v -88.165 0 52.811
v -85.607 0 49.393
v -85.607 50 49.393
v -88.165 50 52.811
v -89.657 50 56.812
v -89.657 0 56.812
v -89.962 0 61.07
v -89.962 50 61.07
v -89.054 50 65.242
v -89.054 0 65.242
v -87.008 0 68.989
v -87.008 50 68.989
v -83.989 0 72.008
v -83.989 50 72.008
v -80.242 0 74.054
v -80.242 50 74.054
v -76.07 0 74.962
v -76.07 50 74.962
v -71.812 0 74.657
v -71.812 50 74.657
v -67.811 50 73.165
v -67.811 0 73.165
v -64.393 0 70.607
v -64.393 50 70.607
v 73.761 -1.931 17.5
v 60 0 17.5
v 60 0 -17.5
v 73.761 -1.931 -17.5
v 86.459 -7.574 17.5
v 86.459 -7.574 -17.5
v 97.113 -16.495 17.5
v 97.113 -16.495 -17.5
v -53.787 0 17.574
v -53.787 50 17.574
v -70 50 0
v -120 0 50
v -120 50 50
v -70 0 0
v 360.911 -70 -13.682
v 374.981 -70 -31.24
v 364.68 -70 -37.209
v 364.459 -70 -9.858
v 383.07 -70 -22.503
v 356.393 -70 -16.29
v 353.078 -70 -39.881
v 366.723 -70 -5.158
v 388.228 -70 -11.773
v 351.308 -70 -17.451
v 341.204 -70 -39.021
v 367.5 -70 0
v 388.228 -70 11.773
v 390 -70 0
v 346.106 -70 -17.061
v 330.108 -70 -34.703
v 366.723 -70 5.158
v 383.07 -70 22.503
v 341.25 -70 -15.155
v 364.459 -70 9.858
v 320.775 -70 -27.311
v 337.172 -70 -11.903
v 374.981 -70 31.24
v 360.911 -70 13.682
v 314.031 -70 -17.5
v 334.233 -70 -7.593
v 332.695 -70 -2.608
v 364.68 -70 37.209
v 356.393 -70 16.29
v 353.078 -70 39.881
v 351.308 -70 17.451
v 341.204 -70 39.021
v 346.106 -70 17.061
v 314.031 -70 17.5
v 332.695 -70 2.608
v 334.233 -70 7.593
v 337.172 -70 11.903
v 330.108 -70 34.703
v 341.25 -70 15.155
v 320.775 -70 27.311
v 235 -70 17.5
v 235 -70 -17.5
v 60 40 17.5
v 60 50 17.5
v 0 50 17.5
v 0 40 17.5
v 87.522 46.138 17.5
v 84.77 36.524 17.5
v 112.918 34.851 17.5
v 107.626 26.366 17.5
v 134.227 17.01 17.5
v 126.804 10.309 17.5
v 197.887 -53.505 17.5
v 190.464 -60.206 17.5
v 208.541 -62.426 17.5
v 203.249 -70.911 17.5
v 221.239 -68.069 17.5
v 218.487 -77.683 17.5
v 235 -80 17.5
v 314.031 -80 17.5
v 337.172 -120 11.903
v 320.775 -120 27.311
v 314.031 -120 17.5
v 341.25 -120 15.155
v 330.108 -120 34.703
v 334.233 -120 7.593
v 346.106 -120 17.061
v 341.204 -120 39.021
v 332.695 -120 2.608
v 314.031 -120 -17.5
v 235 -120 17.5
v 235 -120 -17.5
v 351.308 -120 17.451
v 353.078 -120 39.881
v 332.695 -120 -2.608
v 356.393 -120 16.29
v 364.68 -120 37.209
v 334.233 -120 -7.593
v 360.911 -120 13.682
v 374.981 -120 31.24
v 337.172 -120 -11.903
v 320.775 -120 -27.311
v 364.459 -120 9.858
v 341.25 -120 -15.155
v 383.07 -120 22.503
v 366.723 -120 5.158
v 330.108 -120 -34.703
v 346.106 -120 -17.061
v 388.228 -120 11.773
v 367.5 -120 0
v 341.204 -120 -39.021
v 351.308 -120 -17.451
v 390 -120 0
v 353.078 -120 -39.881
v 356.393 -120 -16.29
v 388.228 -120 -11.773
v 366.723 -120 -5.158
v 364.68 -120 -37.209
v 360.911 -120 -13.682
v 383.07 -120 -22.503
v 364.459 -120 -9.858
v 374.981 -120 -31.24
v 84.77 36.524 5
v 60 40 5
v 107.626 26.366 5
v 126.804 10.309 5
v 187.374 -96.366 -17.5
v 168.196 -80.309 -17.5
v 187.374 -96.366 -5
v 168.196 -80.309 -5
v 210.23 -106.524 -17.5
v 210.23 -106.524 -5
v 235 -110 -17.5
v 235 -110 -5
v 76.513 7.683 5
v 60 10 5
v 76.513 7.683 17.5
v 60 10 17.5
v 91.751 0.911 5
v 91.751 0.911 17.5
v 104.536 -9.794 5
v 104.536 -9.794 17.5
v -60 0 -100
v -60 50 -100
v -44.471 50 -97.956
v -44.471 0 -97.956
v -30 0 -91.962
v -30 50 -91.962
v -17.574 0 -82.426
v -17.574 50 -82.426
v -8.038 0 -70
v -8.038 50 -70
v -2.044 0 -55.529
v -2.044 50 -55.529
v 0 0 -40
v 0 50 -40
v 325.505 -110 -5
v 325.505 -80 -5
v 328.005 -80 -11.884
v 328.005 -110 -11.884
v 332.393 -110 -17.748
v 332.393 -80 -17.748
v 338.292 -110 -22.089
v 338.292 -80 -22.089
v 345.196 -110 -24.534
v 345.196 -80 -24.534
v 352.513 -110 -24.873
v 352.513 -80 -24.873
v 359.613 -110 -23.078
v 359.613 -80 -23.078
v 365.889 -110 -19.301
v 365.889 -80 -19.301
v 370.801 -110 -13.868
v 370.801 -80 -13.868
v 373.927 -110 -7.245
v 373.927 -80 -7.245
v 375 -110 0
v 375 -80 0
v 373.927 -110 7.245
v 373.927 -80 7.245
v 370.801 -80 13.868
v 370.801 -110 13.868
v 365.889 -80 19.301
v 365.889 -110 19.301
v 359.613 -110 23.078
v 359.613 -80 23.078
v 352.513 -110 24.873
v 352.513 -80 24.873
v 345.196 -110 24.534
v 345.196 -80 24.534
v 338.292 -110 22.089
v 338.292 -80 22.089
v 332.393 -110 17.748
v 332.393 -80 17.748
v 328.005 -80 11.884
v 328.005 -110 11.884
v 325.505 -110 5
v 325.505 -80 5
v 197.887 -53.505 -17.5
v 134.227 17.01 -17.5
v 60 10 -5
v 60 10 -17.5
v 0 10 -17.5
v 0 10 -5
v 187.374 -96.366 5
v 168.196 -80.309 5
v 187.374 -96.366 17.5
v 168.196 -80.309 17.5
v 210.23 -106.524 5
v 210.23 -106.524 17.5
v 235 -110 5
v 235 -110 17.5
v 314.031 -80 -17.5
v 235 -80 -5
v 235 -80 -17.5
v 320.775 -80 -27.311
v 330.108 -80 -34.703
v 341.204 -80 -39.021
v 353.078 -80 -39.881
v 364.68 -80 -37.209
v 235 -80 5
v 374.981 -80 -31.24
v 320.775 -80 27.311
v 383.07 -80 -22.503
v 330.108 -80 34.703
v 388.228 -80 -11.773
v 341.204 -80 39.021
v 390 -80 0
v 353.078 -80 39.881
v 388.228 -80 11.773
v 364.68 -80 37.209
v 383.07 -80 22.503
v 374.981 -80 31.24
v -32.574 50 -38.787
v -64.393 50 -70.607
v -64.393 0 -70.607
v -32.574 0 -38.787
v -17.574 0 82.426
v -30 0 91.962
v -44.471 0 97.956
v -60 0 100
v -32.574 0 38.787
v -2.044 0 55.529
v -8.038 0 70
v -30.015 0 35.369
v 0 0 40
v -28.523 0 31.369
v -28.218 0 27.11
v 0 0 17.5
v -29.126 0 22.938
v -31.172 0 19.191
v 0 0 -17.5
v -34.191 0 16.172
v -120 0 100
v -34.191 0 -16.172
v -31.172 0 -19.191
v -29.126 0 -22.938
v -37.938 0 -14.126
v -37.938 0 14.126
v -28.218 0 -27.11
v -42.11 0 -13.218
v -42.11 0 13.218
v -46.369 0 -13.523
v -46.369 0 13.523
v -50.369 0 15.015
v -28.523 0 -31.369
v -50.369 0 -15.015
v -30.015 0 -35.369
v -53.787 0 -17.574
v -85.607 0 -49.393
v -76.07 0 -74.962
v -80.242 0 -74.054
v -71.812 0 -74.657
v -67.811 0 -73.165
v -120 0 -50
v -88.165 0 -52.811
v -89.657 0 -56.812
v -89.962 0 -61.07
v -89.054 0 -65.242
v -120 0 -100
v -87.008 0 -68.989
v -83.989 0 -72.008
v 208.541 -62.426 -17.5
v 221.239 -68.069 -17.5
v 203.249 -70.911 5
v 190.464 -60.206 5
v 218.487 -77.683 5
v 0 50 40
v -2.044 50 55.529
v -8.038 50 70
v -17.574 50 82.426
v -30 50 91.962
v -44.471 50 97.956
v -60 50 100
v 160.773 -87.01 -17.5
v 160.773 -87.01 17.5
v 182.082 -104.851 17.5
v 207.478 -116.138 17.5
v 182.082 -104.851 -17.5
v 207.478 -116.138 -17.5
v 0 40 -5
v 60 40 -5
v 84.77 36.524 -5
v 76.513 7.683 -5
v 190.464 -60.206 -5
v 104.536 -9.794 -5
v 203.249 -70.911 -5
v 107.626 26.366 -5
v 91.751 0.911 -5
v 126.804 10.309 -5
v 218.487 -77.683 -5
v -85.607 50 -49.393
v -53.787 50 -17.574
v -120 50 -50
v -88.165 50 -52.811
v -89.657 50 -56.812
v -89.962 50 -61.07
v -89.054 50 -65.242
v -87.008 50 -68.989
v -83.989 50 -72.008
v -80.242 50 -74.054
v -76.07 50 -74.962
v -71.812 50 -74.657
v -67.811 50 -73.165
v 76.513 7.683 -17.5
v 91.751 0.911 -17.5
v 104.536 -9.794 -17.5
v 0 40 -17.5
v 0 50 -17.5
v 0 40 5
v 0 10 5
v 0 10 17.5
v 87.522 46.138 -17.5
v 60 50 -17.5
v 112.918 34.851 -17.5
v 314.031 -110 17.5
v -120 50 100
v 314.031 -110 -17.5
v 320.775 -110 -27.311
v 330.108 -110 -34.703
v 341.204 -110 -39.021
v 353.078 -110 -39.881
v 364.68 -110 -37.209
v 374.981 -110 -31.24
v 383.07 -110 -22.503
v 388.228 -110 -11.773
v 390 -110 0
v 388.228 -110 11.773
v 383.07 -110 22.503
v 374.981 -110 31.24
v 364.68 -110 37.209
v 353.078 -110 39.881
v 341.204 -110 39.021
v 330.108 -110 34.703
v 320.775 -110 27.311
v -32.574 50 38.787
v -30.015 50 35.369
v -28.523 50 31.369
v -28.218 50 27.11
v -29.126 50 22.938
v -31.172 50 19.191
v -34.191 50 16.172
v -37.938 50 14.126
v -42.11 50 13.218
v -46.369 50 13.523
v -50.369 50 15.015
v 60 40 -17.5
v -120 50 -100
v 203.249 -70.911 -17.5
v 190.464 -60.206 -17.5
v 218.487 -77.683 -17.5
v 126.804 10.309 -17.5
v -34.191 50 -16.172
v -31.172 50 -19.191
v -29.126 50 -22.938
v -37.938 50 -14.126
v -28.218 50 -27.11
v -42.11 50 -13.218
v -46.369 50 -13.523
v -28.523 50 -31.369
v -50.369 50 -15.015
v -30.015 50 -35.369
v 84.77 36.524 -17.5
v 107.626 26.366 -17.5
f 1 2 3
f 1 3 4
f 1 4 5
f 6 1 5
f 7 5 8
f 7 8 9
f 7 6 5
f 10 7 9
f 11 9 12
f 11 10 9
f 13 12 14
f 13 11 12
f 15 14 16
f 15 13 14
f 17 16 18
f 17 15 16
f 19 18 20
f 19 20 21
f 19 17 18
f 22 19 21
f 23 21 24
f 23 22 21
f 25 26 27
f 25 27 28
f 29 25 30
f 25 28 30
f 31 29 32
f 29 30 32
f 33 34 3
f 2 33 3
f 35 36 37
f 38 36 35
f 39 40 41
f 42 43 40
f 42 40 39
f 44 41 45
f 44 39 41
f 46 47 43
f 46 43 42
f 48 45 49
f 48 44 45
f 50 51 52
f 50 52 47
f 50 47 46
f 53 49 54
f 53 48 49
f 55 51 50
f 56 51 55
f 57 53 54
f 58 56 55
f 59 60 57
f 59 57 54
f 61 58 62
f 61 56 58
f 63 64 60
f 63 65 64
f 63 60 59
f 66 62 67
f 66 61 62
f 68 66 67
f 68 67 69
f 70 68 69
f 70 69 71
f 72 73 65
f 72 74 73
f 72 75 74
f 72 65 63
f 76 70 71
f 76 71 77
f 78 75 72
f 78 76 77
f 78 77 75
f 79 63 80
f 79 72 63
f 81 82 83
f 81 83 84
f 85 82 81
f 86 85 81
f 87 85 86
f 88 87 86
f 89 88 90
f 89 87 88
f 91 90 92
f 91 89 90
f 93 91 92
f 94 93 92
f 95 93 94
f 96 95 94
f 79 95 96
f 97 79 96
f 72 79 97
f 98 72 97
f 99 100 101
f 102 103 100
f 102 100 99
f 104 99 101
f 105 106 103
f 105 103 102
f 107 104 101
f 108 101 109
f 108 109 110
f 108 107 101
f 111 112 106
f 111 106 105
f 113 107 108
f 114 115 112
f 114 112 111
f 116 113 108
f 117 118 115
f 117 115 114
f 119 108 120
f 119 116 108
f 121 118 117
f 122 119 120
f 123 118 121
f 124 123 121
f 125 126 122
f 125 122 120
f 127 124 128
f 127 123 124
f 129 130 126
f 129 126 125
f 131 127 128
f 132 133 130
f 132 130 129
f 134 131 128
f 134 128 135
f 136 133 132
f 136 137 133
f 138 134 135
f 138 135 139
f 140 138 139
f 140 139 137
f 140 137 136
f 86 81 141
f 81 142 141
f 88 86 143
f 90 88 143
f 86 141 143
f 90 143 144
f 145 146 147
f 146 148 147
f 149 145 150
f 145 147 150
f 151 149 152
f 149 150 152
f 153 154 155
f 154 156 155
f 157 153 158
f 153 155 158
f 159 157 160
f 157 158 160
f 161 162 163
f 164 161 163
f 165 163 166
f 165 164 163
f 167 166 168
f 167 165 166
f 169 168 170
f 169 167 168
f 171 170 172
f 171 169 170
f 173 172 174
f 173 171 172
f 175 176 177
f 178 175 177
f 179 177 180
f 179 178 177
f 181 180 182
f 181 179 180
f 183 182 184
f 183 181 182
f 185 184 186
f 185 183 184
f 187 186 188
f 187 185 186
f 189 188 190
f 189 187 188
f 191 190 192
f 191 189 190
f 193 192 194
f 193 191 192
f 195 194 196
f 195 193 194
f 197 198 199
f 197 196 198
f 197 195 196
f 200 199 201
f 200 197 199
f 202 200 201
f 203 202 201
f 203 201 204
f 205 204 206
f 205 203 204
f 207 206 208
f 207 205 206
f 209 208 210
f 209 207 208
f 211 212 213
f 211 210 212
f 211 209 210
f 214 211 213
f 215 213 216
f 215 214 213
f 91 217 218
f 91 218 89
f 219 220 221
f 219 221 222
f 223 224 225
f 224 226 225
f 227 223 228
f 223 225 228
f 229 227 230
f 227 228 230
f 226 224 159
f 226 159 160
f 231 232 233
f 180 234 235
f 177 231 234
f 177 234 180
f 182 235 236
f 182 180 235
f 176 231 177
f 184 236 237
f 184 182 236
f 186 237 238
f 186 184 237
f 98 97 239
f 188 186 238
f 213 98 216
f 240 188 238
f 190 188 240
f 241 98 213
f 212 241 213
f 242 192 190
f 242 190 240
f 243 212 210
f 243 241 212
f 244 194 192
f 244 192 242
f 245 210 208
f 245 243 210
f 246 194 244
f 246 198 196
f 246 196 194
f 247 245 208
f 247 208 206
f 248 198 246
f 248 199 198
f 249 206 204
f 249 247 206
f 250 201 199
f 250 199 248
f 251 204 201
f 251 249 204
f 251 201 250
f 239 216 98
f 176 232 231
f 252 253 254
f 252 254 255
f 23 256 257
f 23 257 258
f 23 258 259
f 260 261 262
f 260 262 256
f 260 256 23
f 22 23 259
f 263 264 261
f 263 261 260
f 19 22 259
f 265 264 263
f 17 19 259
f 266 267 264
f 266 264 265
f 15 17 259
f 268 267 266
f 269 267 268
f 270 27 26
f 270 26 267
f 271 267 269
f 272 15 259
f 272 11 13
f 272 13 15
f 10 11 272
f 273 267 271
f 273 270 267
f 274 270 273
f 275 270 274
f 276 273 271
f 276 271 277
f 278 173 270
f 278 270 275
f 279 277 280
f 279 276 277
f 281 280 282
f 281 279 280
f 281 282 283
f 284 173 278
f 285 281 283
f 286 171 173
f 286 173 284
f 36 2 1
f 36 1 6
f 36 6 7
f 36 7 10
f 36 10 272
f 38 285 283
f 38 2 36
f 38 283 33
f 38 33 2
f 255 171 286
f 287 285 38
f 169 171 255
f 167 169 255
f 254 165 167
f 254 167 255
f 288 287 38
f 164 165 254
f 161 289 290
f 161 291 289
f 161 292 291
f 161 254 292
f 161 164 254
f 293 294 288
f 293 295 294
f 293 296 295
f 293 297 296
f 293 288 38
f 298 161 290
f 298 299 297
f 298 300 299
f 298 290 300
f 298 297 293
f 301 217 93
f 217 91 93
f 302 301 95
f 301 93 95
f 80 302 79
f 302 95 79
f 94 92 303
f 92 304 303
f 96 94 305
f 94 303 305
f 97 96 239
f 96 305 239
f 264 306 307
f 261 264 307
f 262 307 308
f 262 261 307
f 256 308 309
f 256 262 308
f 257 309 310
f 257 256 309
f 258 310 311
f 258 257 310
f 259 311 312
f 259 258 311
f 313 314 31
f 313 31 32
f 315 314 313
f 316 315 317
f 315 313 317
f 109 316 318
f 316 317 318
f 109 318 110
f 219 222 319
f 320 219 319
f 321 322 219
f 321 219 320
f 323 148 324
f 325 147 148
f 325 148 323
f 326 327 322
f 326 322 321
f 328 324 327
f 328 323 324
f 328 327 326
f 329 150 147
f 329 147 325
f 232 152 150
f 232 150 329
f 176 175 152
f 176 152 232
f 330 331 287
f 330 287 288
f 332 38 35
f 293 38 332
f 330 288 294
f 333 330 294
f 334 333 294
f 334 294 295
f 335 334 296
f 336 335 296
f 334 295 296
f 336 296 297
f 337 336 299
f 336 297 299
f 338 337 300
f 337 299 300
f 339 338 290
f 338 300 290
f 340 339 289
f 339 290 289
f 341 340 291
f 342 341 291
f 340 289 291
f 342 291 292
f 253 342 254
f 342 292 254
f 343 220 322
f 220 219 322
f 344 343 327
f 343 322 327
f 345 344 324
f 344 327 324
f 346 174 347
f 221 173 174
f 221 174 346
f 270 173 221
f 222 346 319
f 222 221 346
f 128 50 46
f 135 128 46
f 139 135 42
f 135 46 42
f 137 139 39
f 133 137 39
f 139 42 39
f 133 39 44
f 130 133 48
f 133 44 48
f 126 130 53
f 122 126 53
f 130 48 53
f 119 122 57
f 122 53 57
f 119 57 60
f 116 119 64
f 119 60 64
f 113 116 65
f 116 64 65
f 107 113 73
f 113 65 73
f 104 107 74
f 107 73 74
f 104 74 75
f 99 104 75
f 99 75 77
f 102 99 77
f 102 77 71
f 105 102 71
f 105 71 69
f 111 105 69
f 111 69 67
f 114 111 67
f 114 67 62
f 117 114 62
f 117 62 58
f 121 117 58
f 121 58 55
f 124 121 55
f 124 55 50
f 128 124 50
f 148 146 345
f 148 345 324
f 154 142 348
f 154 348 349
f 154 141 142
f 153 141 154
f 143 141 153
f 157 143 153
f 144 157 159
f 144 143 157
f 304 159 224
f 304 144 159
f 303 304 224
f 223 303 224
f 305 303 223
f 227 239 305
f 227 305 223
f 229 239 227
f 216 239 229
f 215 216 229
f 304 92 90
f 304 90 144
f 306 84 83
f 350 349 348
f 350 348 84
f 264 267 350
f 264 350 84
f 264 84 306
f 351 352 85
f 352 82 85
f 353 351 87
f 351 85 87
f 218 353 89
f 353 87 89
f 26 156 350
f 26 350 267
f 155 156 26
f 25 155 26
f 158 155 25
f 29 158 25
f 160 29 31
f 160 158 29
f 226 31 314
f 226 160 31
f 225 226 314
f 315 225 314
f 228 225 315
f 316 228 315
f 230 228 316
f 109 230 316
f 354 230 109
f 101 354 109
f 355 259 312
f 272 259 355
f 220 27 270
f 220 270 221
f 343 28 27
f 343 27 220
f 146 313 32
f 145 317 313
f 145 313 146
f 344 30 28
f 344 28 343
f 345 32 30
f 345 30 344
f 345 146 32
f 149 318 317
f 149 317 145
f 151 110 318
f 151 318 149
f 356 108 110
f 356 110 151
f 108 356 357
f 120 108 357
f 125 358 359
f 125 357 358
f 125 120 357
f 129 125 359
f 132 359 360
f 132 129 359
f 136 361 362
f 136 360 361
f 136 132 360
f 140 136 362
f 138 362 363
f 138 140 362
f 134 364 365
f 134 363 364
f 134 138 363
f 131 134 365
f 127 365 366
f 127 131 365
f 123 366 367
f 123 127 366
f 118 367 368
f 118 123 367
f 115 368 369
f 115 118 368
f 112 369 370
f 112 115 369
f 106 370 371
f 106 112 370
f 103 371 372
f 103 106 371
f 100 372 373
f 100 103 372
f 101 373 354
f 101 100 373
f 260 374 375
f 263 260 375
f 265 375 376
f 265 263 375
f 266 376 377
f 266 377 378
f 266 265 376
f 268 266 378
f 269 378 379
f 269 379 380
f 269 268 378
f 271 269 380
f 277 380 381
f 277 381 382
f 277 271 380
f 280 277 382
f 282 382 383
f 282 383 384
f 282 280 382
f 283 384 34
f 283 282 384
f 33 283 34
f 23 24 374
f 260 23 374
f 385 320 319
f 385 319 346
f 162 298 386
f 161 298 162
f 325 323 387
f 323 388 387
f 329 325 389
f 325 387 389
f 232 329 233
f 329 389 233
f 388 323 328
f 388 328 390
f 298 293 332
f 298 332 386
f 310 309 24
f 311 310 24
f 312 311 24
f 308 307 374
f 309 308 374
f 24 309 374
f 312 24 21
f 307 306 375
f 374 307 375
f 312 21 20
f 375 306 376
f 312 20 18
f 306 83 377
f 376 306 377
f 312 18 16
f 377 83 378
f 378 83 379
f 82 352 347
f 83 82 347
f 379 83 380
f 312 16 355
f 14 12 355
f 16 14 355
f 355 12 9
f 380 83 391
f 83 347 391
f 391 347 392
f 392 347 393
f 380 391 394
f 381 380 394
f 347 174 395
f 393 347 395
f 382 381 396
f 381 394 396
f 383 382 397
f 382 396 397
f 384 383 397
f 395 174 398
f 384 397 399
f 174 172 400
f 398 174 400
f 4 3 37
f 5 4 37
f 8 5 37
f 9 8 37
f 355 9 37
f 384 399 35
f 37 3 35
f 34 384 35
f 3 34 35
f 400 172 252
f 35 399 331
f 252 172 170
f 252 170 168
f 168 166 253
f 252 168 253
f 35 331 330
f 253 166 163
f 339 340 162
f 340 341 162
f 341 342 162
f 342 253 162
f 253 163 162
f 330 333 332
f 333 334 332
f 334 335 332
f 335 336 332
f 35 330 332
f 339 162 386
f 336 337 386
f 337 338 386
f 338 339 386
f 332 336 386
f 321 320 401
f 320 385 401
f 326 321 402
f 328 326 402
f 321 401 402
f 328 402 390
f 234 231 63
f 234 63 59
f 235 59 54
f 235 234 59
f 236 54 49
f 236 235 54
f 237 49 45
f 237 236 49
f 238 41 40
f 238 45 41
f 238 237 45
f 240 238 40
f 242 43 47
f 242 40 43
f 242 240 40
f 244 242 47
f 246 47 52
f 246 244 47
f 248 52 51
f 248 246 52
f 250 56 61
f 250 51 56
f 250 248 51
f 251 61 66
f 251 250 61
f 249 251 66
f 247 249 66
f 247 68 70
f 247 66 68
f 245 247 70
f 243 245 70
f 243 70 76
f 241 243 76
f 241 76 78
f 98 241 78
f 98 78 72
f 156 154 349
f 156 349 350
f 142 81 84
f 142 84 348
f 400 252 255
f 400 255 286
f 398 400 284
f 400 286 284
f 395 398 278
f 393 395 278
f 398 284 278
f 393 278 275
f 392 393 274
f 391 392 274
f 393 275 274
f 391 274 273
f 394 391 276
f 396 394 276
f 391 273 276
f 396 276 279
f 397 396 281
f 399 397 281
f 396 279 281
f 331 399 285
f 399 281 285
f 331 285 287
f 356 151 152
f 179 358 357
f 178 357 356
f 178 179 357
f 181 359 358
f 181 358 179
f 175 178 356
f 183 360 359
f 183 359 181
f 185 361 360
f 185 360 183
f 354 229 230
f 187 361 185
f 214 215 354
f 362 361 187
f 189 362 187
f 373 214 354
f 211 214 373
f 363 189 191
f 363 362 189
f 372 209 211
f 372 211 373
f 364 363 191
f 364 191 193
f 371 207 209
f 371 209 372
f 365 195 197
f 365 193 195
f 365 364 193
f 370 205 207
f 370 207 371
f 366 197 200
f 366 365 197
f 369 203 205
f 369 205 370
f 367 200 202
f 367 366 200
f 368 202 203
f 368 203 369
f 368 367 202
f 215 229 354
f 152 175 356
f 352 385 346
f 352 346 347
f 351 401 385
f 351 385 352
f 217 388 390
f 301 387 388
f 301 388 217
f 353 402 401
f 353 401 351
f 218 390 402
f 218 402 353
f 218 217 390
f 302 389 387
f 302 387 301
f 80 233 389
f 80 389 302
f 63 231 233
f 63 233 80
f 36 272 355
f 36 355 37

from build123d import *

# Parameters (mm, degrees)
EXTRUDE_1_DEPTH     = 50
SKETCH_5_R          = 17.5
CUT_EXTRUDE_1_DEPTH = 51


with BuildPart() as part:
    # 草圖1 → 填料-伸長1 (new body)
    with BuildSketch(Plane(origin=(0, 0, 0), x_dir=(1, 0, 0), z_dir=(0, 1, 0))):
        with BuildLine():
            Line((-120, 100), (-60, 100))
            ThreePointArc((-60, 100), (-17.573593129, 82.426406871), (0, 40))
            Line((0, 40), (0, -40))
            ThreePointArc((0, -40), (-17.573593129, -82.426406871), (-60, -100))
            Line((-60, -100), (-120, -100))
            Line((-120, -100), (-120, -50))
            Line((-120, -50), (-70, 0))
            Line((-70, 0), (-120, 50))
            Line((-120, 50), (-120, 100))
        make_face()
        with BuildLine():
            Line((-64.393398282, 70.606601718), (-32.573593129, 38.786796564))
            ThreePointArc((-32.573593129, 38.786796564), (-32.573593129, 17.573593129), (-53.786796564, 17.573593129))
            Line((-53.786796564, 17.573593129), (-85.606601718, 49.393398282))
            ThreePointArc((-85.606601718, 49.393398282), (-85.606601718, 70.606601718), (-64.393398282, 70.606601718))
        make_face(mode=Mode.SUBTRACT)
        with BuildLine():
            Line((-64.393398282, -70.606601718), (-32.573593129, -38.786796564))
            ThreePointArc((-32.573593129, -38.786796564), (-32.573593129, -17.573593129), (-53.786796564, -17.573593129))
            Line((-53.786796564, -17.573593129), (-85.606601718, -49.393398282))
            ThreePointArc((-85.606601718, -49.393398282), (-85.606601718, -70.606601718), (-64.393398282, -70.606601718))
        make_face(mode=Mode.SUBTRACT)
    extrude(amount=EXTRUDE_1_DEPTH)

    # 掃出1: sweep along a path in 草圖2
    with BuildLine(Plane.XY) as sweep_1_path:
        Line((0, 50), (60, 50))
        ThreePointArc((60, 50), (100.613846605, 41.381154862), (134.226804124, 17.010309278))
        Line((134.226804124, 17.010309278), (197.886597938, -53.505154639))
        ThreePointArc((197.886597938, -53.505154639), (214.693076697, -65.690577431), (235, -70))
        Line((235, -70), (350, -70))
    # 草圖3 → 掃出1 (sweep)
    with BuildSketch(Plane(origin=(0, 0, 0), x_dir=(0, 0, -1), z_dir=(1, 0, 0))):
        Polygon((17.5, 50), (-17.5, 50), (-17.5, 40), (-5, 40), (-5, 10), (-17.5, 10), (-17.5, 0), (17.5, 0), (17.5, 10), (5, 10), (5, 40), (17.5, 40), align=None)
    sweep(path=sweep_1_path.line)

    # 草圖4 → 旋轉1 (revolve)
    with BuildSketch(Plane.XY):
        Polygon((350, -70), (390, -70), (390, -80), (375, -80), (375, -110), (390, -110), (390, -120), (350, -120), align=None)
    revolve(axis=Axis((350, -47.23777031, 0), (0, -1, 0)))

    # 草圖5 → 除料-伸長1 (cut, through all)
    with BuildSketch(Plane(origin=(0, -70, 0), x_dir=(1, 0, 0), z_dir=(0, 1, 0))):
        with Locations((350, 0)):
            Circle(SKETCH_5_R)
    extrude(amount=-CUT_EXTRUDE_1_DEPTH, mode=Mode.SUBTRACT)


solid = part.part
